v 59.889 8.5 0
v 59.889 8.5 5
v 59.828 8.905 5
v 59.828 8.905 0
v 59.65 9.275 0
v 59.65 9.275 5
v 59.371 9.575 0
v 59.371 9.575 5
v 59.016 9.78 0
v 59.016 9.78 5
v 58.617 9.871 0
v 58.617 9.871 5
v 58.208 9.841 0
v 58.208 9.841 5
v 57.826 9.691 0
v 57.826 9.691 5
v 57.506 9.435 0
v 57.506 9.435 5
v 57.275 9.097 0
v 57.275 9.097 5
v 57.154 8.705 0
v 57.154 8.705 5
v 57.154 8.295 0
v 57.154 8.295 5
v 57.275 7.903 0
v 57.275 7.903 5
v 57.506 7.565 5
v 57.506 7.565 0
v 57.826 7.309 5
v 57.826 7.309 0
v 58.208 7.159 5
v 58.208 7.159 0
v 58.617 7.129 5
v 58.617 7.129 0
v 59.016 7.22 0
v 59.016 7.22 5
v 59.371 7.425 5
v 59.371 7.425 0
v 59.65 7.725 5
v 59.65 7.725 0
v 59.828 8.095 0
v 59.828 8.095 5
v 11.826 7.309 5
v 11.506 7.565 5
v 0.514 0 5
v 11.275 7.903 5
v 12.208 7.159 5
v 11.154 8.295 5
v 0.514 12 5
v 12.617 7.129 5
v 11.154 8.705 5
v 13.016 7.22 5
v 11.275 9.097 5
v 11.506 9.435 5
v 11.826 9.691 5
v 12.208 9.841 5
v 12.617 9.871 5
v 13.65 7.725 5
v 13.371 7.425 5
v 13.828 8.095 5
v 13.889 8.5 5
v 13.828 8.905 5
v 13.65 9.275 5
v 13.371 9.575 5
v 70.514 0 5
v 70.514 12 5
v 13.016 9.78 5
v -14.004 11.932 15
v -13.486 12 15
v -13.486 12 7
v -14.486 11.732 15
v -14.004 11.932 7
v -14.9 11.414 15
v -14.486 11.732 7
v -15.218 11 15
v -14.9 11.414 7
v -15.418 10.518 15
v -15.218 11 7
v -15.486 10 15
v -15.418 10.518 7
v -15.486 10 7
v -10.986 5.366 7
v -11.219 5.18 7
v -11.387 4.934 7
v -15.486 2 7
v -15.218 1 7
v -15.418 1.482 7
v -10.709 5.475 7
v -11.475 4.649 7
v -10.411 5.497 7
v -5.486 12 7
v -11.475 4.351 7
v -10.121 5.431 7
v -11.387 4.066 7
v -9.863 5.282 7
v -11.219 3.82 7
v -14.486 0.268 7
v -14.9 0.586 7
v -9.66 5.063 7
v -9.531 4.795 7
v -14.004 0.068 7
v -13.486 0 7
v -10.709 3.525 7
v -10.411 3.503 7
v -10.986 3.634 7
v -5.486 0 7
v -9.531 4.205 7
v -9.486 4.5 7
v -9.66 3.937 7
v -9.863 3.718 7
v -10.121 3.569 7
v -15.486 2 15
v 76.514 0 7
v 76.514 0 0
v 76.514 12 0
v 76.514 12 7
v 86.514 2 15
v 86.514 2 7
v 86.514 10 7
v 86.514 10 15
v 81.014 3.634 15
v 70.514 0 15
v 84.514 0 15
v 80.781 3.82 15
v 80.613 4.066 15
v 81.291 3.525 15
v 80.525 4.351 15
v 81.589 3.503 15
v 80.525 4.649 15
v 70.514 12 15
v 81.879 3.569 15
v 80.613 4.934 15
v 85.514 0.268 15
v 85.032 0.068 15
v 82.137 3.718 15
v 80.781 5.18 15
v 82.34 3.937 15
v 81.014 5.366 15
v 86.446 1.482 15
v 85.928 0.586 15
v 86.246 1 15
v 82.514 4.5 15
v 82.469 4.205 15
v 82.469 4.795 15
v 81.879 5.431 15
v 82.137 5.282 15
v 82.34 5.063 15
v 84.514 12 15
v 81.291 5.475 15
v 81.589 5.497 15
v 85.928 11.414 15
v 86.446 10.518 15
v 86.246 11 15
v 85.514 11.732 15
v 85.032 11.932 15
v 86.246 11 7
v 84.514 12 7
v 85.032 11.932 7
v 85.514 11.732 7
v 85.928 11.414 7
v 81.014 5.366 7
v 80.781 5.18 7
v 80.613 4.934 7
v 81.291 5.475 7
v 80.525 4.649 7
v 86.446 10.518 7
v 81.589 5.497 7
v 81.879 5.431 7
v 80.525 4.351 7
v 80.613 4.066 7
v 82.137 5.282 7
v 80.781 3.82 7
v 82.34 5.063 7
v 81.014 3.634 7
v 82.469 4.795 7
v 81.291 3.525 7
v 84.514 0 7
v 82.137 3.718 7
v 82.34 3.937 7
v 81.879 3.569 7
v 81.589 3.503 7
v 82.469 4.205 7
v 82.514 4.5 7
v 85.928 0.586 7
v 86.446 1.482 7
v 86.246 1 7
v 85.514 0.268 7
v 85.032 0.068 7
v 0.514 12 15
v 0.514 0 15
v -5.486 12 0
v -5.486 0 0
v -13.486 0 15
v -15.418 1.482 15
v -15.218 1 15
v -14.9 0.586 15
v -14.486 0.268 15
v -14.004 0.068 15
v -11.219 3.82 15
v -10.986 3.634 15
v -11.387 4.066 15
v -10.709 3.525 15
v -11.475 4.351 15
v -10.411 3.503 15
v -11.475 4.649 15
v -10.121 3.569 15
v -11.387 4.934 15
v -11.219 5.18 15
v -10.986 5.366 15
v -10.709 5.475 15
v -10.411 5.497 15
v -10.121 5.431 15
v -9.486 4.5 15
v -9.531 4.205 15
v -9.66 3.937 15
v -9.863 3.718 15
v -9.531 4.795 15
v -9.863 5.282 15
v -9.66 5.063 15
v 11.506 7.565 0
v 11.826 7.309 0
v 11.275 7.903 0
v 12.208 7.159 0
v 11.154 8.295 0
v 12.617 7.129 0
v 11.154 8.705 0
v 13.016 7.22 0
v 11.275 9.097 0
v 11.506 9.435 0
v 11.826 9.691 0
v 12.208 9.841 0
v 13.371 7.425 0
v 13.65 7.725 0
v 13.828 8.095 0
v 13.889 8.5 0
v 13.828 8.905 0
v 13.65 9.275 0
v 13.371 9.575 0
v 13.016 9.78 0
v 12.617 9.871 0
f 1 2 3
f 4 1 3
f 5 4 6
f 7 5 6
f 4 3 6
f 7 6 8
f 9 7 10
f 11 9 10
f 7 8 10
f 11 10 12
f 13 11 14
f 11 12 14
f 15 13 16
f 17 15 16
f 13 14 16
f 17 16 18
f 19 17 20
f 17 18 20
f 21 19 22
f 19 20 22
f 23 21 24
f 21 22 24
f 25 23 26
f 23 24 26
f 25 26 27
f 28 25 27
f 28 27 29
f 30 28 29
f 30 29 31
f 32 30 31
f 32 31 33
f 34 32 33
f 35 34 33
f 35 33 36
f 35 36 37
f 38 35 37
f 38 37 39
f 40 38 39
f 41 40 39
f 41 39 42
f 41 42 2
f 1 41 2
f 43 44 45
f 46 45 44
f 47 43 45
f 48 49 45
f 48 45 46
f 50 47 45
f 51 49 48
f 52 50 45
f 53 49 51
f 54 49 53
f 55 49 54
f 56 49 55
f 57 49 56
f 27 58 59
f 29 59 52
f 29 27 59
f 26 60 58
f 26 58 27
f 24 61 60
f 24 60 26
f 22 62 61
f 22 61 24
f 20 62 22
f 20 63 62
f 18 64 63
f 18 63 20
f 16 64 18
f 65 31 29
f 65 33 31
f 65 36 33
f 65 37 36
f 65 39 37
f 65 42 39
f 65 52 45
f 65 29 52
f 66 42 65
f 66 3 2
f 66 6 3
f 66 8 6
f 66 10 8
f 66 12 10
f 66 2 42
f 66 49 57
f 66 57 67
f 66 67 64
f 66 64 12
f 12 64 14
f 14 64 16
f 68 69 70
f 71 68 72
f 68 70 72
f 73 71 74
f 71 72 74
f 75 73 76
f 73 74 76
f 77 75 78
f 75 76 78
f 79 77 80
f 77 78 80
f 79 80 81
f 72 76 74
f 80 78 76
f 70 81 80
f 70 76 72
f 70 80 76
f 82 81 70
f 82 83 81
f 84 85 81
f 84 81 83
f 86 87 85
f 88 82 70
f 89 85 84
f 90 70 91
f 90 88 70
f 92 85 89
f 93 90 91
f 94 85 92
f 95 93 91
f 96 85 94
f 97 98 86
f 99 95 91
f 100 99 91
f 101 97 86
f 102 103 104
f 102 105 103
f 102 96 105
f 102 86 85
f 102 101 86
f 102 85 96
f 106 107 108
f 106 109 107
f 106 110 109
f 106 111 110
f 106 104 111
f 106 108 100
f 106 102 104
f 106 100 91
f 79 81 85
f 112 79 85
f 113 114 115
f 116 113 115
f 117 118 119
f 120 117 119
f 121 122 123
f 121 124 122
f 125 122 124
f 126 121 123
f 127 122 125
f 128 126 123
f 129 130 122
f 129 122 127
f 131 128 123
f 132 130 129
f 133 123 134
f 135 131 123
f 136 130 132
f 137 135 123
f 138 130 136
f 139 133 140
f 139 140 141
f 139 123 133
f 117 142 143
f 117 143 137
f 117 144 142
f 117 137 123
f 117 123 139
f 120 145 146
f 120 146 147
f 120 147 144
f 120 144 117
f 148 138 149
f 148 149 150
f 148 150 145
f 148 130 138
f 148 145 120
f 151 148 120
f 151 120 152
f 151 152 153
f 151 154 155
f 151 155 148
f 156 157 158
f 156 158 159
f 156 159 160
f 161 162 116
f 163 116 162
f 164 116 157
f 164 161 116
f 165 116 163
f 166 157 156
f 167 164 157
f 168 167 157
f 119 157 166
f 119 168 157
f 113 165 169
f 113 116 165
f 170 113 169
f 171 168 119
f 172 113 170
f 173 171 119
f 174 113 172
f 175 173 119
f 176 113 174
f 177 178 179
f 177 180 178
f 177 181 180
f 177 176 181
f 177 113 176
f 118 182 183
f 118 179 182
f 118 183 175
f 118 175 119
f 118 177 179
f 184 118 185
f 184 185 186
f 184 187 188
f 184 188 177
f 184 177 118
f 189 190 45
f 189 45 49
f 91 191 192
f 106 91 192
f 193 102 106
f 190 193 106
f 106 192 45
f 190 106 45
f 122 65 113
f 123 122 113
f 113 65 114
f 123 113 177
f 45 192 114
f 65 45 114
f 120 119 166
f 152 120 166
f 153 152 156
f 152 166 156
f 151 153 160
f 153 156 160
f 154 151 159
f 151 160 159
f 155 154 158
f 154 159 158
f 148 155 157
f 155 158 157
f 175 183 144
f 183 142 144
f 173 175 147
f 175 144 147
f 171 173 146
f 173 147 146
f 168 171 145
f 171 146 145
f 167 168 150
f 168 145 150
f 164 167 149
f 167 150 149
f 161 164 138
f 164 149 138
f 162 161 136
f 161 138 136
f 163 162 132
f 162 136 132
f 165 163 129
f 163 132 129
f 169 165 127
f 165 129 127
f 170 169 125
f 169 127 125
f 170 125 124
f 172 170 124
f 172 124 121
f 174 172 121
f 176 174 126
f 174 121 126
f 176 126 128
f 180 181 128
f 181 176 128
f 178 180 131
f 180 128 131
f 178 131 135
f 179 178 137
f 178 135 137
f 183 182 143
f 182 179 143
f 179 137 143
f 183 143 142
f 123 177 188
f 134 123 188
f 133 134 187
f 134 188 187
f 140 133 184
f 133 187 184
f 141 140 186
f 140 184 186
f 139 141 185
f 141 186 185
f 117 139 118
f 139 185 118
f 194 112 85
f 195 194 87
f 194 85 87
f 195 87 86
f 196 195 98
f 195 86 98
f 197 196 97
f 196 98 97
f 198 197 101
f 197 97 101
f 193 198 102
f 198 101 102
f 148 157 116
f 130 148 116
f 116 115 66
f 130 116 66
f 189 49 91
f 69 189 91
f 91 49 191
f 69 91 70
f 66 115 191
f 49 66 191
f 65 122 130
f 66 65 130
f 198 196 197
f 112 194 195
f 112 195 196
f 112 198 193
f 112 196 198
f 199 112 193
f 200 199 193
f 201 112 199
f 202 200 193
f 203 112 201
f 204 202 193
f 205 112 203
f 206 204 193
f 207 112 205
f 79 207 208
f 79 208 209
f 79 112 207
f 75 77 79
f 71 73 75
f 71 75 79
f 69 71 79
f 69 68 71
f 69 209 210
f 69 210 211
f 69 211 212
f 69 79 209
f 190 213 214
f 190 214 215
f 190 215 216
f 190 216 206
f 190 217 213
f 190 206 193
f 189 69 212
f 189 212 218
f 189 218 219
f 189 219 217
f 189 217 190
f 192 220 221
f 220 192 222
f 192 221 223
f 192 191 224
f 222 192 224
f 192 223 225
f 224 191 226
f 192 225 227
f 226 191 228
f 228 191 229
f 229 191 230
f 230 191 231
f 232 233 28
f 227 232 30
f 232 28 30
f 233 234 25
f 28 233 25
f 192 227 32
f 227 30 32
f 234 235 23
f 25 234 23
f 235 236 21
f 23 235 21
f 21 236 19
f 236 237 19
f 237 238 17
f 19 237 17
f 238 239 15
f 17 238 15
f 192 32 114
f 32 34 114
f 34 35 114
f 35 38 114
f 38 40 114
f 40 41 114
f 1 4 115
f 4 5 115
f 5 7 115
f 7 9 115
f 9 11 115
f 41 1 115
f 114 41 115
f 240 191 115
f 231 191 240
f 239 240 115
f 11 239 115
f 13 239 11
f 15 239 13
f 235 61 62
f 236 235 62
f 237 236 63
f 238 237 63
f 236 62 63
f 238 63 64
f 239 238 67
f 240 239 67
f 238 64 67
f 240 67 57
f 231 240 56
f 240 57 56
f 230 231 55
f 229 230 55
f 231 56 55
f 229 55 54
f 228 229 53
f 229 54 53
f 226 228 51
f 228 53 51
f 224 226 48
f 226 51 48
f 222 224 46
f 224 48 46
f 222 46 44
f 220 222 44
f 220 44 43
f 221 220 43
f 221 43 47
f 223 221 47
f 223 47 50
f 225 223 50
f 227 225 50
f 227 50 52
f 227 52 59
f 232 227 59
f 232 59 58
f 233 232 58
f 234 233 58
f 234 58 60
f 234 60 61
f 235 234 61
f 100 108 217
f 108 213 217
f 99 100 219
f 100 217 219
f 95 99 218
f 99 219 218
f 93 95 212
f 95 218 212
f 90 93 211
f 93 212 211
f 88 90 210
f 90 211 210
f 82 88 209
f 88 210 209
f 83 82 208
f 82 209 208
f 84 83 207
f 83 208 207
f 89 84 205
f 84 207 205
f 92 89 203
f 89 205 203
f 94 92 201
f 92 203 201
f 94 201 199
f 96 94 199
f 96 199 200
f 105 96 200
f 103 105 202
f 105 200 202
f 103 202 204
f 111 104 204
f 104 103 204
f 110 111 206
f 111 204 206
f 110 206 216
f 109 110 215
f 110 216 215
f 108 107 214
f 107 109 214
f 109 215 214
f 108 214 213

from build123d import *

# Parameters (mm, degrees)
F1_DEPTH      = 15
F2_W          = 70
F2_H          = 12
F3_DEPTH      = 10
F4_R          = 1.375
F4_R_2        = 1
F5_DEPTH      = 25
F5_DEPTH_BACK = 25
F6_R          = 1
F7_DEPTH      = 7


with BuildPart() as f1:
    # F0 (on Top) → F1 (new body)
    with BuildSketch(Plane.XY):
        with BuildLine():
            ThreePointArc((-15.4861029406, 2), (-14.9003165029, 0.5857864376), (-13.4861029406, 0))
            Line((-13.4861029406, 0), (84.5138970594, 0))
            ThreePointArc((84.5138970594, 0), (85.9281106218, 0.5857864376), (86.5138970594, 2))
            Line((86.5138970594, 2), (86.5138970594, 10))
            ThreePointArc((86.5138970594, 10), (85.9281106218, 11.4142135624), (84.5138970594, 12))
            Line((84.5138970594, 12), (-13.4861029406, 12))
            ThreePointArc((-13.4861029406, 12), (-14.9003165029, 11.4142135624), (-15.4861029406, 10))
            Line((-15.4861029406, 10), (-15.4861029406, 2))
        make_face()
    extrude(amount=F1_DEPTH)

    # F2 (on face) → F3 (cut)
    with BuildSketch(Plane.XY.offset(15)):
        with Locations((35.5138970594, 6)):
            Rectangle(F2_W, F2_H)
    extrude(amount=-F3_DEPTH, mode=Mode.SUBTRACT)

    # F4 (on face) → F5 (cut, two sides)
    with BuildSketch(Plane.XY.offset(5)) as f5_sk:
        with Locations((12.5138970594, 8.5)):
            Circle(F4_R)
        with Locations((58.5138970594, 8.5)):
            Circle(F4_R)
        with Locations((-10.4861029406, 4.5)):
            Circle(F4_R_2)
        with Locations((81.5138970594, 4.5)):
            Circle(F4_R_2)
    extrude(amount=-F5_DEPTH, mode=Mode.SUBTRACT)
    extrude(f5_sk.sketch, amount=F5_DEPTH_BACK, mode=Mode.SUBTRACT)

    # F6 (on face) → F7 (cut)
    with BuildSketch(Plane(origin=(0, 0, 0), x_dir=(1, 0, 0), z_dir=(0, 0, -1))):
        with BuildLine():
            Line((76.5138970594, 0), (76.5138970594, -12))
            Line((76.5138970594, -12), (84.5138970594, -12))
            ThreePointArc((84.5138970594, -12), (85.9281106218, -11.4142135624), (86.5138970594, -10))
            Line((86.5138970594, -10), (86.5138970594, -2))
            ThreePointArc((86.5138970594, -2), (85.9281106218, -0.5857864376), (84.5138970594, 0))
            Line((84.5138970594, 0), (76.5138970594, 0))
        make_face()
        with Locations((81.5138970594, -4.5)):
            Circle(F6_R, mode=Mode.SUBTRACT)
        with BuildLine():
            Line((-13.4861029406, -12), (-5.4861029406, -12))
            Line((-5.4861029406, -12), (-5.4861029406, 0))
            Line((-5.4861029406, 0), (-13.4861029406, 0))
            ThreePointArc((-13.4861029406, 0), (-14.9003165029, -0.5857864376), (-15.4861029406, -2))
            Line((-15.4861029406, -2), (-15.4861029406, -10))
            ThreePointArc((-15.4861029406, -10), (-14.9003165029, -11.4142135624), (-13.4861029406, -12))
        make_face()
        with Locations((-10.4861029406, -4.5)):
            Circle(F6_R, mode=Mode.SUBTRACT)
    extrude(amount=-F7_DEPTH, mode=Mode.SUBTRACT)


solid = f1.part
